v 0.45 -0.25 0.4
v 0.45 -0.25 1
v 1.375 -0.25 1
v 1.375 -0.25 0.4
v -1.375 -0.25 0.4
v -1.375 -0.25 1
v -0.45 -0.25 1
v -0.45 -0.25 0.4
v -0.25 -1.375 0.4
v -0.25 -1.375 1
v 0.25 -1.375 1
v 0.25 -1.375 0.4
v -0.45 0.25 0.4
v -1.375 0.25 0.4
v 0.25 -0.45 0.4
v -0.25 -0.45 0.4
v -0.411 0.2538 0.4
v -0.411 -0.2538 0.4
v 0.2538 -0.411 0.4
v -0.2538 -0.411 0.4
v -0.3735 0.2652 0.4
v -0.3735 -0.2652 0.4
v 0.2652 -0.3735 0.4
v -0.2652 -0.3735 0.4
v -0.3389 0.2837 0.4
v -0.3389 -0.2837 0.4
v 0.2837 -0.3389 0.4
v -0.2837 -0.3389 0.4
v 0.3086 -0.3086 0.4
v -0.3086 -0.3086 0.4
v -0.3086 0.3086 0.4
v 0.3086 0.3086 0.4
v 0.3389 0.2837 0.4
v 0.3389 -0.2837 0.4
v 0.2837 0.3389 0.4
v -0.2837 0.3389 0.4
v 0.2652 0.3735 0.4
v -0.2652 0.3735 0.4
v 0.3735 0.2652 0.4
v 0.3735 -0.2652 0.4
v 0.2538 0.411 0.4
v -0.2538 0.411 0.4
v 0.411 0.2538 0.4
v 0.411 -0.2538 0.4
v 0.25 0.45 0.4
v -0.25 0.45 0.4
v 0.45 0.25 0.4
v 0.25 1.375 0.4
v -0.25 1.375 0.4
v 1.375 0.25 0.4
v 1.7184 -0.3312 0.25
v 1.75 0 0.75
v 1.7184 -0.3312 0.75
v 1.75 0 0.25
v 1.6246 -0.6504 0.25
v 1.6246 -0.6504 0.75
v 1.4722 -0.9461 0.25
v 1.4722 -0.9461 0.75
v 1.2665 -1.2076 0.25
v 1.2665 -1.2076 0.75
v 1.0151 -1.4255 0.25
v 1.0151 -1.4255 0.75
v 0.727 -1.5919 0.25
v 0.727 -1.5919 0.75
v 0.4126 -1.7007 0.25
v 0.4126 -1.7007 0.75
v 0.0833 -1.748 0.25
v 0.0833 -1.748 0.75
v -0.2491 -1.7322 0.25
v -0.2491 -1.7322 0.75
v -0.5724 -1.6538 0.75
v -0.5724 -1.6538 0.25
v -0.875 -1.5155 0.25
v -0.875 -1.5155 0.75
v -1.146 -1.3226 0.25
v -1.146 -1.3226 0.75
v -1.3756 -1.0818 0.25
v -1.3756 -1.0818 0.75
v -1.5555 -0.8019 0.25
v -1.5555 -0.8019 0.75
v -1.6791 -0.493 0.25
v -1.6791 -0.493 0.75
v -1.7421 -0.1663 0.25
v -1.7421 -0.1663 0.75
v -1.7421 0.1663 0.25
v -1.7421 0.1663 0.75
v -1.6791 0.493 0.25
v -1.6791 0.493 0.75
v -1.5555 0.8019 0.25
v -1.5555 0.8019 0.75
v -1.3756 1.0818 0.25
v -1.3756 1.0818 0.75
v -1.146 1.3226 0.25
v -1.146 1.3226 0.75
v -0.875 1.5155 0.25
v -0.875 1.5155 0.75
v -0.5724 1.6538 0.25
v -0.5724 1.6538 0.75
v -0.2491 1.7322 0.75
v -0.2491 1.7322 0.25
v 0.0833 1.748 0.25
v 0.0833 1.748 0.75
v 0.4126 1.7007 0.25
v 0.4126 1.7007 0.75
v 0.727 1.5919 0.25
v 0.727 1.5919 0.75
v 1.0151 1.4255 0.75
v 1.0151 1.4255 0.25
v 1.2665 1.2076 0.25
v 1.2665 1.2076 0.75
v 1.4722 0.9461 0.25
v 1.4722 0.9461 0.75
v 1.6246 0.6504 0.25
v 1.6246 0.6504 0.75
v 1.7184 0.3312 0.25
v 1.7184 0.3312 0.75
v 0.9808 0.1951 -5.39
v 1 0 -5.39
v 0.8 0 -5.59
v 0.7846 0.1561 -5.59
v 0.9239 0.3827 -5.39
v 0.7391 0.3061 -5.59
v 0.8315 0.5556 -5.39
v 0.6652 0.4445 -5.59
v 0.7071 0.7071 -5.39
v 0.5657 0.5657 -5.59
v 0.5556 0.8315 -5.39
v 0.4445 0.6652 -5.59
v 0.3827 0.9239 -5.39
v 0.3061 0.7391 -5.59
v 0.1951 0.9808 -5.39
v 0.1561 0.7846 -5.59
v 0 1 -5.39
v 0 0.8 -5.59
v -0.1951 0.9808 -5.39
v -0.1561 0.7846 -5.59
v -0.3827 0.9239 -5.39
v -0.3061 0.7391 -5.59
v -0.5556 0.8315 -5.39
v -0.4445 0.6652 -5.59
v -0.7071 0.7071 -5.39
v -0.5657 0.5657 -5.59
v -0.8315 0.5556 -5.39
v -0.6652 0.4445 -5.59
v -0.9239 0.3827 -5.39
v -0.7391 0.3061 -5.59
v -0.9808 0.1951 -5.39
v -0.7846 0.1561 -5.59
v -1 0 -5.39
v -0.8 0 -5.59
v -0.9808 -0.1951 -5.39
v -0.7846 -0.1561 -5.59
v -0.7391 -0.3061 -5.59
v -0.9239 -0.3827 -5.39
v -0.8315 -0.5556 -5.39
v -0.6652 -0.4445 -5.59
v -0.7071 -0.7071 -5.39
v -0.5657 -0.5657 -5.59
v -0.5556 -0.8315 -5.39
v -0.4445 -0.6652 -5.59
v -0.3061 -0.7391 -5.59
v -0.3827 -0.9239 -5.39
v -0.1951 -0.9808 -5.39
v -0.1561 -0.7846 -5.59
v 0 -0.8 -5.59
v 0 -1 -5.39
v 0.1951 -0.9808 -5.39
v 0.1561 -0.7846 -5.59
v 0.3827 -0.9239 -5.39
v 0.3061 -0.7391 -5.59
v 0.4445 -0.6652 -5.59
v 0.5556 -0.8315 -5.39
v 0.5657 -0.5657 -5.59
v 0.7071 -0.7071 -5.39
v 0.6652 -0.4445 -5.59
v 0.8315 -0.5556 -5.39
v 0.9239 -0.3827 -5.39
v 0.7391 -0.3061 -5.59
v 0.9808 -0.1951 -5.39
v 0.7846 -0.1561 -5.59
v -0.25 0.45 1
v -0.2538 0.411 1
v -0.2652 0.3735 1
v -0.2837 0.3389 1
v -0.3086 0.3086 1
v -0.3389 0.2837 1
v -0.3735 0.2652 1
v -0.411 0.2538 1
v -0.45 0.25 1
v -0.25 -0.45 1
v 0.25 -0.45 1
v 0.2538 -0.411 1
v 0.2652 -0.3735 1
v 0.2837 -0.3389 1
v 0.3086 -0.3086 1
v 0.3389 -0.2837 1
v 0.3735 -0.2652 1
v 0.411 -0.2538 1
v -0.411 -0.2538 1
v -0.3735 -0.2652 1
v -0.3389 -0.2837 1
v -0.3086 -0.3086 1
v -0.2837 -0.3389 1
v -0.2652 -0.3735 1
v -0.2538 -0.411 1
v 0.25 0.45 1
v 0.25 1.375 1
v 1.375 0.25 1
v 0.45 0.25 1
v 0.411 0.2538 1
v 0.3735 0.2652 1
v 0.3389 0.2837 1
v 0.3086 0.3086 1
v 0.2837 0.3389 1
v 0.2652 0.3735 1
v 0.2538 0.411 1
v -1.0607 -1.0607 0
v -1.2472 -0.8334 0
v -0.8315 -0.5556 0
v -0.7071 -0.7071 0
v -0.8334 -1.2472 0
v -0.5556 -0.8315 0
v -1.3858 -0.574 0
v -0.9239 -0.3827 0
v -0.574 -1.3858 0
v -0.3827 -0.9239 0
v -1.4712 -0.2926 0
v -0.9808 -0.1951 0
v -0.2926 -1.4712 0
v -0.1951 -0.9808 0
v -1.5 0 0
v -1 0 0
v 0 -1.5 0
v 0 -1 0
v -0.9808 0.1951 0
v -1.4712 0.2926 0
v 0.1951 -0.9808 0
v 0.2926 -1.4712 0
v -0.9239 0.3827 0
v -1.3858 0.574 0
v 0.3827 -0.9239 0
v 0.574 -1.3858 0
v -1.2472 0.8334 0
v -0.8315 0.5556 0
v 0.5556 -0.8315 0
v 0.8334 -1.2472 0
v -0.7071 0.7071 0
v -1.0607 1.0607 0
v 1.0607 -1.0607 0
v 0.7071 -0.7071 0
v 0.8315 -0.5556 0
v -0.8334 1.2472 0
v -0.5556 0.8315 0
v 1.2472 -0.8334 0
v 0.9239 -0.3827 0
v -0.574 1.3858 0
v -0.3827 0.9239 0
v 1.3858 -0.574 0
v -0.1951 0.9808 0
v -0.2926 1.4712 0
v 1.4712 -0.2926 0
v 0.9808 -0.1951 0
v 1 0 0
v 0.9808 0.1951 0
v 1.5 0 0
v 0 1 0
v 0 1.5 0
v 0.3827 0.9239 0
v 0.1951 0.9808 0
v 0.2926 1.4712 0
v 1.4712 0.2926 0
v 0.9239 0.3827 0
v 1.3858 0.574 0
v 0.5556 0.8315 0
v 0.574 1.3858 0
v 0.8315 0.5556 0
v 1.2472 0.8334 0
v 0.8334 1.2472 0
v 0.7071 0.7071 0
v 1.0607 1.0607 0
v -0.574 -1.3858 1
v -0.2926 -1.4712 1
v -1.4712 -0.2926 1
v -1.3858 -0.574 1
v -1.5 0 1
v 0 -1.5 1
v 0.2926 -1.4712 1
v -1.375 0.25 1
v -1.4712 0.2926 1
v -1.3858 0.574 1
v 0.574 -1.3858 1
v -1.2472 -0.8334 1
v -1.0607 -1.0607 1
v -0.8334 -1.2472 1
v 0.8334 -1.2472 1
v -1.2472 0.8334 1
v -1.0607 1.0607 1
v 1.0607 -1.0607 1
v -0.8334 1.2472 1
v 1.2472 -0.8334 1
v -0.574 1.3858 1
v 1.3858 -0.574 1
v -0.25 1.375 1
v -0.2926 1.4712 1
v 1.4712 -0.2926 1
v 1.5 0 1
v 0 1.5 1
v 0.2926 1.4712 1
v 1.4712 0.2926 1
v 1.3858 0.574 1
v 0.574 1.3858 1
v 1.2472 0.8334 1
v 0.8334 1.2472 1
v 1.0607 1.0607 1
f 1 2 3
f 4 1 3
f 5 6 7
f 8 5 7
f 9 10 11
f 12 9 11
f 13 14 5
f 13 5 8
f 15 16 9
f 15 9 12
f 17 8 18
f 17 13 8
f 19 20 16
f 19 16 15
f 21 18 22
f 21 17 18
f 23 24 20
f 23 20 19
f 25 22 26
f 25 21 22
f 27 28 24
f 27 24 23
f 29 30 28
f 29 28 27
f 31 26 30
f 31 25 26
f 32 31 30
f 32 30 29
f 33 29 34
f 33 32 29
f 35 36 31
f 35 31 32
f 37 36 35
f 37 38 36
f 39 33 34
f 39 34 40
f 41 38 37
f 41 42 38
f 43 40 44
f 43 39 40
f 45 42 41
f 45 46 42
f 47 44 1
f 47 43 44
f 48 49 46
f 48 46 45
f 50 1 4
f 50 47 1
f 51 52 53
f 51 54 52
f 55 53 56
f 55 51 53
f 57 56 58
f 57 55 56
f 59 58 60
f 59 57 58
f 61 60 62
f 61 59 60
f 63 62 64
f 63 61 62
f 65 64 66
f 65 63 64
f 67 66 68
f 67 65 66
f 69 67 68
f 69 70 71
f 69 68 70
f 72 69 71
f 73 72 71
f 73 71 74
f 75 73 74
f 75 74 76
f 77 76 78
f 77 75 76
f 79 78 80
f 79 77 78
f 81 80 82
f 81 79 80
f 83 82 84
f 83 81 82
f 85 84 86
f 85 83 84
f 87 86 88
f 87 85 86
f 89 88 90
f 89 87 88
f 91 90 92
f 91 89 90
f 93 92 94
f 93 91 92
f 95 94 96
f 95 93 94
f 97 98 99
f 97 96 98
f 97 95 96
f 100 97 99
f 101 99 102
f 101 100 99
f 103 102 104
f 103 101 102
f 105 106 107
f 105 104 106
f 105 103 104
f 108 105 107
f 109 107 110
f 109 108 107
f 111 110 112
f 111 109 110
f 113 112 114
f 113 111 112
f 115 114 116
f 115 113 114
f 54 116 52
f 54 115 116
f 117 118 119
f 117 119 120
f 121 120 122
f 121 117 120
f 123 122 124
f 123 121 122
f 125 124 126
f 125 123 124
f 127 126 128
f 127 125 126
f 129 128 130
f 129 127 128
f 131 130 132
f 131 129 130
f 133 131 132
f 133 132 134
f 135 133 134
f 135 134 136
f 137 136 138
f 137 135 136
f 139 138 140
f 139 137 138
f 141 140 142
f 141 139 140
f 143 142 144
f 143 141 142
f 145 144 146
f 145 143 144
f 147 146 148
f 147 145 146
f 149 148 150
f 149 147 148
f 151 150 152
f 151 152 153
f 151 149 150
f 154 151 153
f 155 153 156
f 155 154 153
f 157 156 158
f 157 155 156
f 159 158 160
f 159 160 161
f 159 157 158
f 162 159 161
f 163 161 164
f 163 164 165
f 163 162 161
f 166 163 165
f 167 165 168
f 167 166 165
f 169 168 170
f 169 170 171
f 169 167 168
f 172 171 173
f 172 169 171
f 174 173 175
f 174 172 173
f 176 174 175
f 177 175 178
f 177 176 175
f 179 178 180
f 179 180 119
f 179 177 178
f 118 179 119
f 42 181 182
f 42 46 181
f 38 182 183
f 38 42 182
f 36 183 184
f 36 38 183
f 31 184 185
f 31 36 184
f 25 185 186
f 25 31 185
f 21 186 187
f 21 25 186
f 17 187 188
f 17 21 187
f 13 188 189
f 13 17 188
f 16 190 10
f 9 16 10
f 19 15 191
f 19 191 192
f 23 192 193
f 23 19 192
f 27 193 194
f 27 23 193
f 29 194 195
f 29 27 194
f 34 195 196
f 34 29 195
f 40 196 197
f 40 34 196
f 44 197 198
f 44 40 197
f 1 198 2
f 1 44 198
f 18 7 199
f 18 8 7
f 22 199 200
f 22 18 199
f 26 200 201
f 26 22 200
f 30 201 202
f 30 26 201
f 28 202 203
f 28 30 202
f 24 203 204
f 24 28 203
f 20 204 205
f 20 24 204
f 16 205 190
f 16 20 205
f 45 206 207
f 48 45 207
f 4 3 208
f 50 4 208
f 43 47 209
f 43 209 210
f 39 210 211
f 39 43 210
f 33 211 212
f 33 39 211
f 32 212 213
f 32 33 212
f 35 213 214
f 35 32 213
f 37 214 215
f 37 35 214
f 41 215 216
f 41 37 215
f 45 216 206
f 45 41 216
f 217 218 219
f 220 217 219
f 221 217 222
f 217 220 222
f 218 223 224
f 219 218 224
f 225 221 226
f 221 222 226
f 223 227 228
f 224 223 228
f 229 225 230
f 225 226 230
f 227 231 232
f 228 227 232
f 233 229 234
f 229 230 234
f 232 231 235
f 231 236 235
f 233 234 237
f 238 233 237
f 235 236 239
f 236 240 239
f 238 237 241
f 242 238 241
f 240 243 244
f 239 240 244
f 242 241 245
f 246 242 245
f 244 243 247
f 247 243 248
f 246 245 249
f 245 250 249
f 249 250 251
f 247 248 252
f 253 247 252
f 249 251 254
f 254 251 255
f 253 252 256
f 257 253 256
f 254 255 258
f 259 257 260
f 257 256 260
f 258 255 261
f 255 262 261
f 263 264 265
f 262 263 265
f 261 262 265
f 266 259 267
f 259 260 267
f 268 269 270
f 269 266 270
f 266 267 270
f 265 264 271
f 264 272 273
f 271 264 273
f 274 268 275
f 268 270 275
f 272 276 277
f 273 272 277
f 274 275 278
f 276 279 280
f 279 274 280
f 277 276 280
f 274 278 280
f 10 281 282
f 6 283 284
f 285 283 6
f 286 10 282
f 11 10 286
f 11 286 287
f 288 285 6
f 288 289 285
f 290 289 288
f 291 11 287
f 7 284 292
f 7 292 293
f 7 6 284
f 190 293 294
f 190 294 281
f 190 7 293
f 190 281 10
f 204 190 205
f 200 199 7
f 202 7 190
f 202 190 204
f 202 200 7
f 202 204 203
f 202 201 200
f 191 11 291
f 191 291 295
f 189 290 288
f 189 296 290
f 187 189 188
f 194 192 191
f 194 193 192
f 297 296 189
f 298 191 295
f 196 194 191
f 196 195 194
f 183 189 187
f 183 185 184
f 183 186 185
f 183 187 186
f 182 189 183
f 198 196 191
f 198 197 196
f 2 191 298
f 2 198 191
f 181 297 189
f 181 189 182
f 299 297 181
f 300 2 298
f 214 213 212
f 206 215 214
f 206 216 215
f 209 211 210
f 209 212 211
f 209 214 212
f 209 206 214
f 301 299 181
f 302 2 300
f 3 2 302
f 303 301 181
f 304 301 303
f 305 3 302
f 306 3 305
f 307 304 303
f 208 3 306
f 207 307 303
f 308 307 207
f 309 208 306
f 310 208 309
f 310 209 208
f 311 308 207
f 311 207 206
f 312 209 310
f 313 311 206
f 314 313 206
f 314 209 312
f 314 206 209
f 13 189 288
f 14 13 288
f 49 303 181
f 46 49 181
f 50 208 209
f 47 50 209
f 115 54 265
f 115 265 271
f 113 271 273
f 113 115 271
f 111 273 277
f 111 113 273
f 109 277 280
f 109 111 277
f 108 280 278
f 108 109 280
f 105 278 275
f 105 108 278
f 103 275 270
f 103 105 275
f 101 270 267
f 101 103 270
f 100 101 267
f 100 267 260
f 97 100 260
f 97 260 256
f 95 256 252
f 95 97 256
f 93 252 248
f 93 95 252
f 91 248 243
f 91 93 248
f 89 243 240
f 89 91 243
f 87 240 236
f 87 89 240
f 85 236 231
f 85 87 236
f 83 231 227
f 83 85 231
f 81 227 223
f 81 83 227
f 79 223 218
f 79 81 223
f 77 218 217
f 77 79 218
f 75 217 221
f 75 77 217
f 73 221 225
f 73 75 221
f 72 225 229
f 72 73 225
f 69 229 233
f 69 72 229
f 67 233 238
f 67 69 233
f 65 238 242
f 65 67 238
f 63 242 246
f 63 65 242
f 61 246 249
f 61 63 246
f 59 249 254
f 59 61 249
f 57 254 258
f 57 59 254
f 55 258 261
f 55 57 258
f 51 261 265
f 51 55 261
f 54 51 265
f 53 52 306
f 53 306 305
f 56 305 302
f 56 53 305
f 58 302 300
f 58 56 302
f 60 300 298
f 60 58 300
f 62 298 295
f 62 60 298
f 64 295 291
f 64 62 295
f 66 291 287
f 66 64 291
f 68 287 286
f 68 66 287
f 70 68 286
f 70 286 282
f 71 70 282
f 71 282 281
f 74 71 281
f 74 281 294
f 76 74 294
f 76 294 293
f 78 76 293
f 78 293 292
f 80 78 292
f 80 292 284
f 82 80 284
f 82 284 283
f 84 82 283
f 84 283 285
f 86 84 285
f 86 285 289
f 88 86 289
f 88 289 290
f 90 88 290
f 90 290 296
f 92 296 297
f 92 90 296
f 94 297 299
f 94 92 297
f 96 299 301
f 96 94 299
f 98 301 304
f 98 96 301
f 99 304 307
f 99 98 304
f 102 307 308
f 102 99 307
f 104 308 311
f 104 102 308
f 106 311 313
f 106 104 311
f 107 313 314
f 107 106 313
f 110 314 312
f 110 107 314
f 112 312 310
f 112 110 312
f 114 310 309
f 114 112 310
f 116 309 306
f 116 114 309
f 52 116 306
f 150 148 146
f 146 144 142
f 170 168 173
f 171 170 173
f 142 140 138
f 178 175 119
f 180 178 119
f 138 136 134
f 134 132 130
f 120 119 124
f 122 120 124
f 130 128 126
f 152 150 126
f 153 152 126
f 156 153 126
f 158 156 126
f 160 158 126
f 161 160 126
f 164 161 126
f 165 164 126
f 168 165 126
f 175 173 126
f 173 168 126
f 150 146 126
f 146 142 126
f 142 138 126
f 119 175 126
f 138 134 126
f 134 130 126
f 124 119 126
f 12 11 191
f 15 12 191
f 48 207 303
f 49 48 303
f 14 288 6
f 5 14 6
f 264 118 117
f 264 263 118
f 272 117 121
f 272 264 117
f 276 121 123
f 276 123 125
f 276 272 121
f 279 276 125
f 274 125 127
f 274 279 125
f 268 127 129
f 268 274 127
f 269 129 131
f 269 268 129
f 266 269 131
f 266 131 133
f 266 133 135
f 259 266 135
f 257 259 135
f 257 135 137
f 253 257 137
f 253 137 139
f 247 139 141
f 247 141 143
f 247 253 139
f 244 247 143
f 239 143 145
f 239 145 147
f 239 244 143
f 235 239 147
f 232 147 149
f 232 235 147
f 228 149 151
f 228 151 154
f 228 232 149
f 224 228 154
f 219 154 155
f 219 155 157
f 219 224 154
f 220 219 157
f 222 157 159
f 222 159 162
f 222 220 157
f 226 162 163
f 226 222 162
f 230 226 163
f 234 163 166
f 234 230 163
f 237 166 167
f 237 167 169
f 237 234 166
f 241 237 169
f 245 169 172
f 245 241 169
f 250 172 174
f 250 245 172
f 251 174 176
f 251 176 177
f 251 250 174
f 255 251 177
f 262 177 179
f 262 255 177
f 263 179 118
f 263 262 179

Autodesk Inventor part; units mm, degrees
ref_plane "YZ Plane" through (0, 0, 0) normal (1, 0, 0) x (0, 1, 0)
ref_plane "XZ Plane" through (0, 0, 0) normal (0, 1, 0) x (-1, 0, 0)
ref_plane "XY Plane" through (0, 0, 0) normal (0, 0, 1) x (1, 0, 0)
sketch "Esboço1" plane through (0, 0, 0) normal (0, 0, 1) x (1, 0, 0)
  circle A0 centre (0, 0) radius 1
  dimension "d0" = 2
extrude "Extrusão1" add sketch "Esboço1" against normal blind 5.59
sketch "Esboço2" plane through (0, 0, 0) normal (0, 0, 1) x (1, 0, 0)
  circle A0 centre (0, 0) radius 1.75
  dimension "d3" = 3.5
extrude "Extrusão2" add sketch "Esboço2" along normal blind 1
sketch "Esboço3" plane through (0, 0, 1) normal (0, 0, 1) x (1, 0, 0)
  line L0 (-0.25, -1.375) -> (0.25, -1.375)
  line L1 (0.25, -1.375) -> (0.25, 1.375)
  line L2 (0.25, 1.375) -> (-0.25, 1.375)
  line L3 (-0.25, 1.375) -> (-0.25, -1.375)
  line L4 (-0.25, -1.375) -> (0.25, 1.375) construction
  line L5 (0.25, -1.375) -> (-0.25, 1.375) construction
  line L6 (-1.375, -0.25) -> (1.375, -0.25)
  line L7 (1.375, -0.25) -> (1.375, 0.25)
  line L8 (1.375, 0.25) -> (-1.375, 0.25)
  line L9 (-1.375, 0.25) -> (-1.375, -0.25)
  line L10 (-1.375, -0.25) -> (1.375, 0.25) construction
  line L11 (1.375, -0.25) -> (-1.375, 0.25) construction
  point P0 (0, 0)
  point P1 (-0.25, 0.25)
  point P2 (-0.25, -0.25)
  point P3 (0.25, -0.25)
  point P4 (0.25, 0.25)
  dimension "d6" = 0.5
  dimension "d7" = 0.5
  dimension "d8" = 2.75
  dimension "d9" = 2.75
extrude "Extrusão3" cut sketch "Esboço3" against normal blind 0.6
thread "Rosca1" size "M2x0.4" class "6g" standard "ANSI Metric M Profile" length 15.255
fillet "Arredondamento2" radius 0.2 4 edges at (-0.25, 0.25, 0.7) (0.25, 0.25, 0.7) (-0.25, -0.25, 0.7) (0.25, -0.25, 0.7)
chamfer "Chanfro1" distance 0.25 angle 45 2 edges at (-1.75, 0, 1) (-1.75, 0, 0)
chamfer "Chanfro2" distance 0.2 angle 45 1 edges at (-1, 0, -5.59)
properties part number "Parafuso 2_2 mm" material "Liga de Nickel-Copper 400"
